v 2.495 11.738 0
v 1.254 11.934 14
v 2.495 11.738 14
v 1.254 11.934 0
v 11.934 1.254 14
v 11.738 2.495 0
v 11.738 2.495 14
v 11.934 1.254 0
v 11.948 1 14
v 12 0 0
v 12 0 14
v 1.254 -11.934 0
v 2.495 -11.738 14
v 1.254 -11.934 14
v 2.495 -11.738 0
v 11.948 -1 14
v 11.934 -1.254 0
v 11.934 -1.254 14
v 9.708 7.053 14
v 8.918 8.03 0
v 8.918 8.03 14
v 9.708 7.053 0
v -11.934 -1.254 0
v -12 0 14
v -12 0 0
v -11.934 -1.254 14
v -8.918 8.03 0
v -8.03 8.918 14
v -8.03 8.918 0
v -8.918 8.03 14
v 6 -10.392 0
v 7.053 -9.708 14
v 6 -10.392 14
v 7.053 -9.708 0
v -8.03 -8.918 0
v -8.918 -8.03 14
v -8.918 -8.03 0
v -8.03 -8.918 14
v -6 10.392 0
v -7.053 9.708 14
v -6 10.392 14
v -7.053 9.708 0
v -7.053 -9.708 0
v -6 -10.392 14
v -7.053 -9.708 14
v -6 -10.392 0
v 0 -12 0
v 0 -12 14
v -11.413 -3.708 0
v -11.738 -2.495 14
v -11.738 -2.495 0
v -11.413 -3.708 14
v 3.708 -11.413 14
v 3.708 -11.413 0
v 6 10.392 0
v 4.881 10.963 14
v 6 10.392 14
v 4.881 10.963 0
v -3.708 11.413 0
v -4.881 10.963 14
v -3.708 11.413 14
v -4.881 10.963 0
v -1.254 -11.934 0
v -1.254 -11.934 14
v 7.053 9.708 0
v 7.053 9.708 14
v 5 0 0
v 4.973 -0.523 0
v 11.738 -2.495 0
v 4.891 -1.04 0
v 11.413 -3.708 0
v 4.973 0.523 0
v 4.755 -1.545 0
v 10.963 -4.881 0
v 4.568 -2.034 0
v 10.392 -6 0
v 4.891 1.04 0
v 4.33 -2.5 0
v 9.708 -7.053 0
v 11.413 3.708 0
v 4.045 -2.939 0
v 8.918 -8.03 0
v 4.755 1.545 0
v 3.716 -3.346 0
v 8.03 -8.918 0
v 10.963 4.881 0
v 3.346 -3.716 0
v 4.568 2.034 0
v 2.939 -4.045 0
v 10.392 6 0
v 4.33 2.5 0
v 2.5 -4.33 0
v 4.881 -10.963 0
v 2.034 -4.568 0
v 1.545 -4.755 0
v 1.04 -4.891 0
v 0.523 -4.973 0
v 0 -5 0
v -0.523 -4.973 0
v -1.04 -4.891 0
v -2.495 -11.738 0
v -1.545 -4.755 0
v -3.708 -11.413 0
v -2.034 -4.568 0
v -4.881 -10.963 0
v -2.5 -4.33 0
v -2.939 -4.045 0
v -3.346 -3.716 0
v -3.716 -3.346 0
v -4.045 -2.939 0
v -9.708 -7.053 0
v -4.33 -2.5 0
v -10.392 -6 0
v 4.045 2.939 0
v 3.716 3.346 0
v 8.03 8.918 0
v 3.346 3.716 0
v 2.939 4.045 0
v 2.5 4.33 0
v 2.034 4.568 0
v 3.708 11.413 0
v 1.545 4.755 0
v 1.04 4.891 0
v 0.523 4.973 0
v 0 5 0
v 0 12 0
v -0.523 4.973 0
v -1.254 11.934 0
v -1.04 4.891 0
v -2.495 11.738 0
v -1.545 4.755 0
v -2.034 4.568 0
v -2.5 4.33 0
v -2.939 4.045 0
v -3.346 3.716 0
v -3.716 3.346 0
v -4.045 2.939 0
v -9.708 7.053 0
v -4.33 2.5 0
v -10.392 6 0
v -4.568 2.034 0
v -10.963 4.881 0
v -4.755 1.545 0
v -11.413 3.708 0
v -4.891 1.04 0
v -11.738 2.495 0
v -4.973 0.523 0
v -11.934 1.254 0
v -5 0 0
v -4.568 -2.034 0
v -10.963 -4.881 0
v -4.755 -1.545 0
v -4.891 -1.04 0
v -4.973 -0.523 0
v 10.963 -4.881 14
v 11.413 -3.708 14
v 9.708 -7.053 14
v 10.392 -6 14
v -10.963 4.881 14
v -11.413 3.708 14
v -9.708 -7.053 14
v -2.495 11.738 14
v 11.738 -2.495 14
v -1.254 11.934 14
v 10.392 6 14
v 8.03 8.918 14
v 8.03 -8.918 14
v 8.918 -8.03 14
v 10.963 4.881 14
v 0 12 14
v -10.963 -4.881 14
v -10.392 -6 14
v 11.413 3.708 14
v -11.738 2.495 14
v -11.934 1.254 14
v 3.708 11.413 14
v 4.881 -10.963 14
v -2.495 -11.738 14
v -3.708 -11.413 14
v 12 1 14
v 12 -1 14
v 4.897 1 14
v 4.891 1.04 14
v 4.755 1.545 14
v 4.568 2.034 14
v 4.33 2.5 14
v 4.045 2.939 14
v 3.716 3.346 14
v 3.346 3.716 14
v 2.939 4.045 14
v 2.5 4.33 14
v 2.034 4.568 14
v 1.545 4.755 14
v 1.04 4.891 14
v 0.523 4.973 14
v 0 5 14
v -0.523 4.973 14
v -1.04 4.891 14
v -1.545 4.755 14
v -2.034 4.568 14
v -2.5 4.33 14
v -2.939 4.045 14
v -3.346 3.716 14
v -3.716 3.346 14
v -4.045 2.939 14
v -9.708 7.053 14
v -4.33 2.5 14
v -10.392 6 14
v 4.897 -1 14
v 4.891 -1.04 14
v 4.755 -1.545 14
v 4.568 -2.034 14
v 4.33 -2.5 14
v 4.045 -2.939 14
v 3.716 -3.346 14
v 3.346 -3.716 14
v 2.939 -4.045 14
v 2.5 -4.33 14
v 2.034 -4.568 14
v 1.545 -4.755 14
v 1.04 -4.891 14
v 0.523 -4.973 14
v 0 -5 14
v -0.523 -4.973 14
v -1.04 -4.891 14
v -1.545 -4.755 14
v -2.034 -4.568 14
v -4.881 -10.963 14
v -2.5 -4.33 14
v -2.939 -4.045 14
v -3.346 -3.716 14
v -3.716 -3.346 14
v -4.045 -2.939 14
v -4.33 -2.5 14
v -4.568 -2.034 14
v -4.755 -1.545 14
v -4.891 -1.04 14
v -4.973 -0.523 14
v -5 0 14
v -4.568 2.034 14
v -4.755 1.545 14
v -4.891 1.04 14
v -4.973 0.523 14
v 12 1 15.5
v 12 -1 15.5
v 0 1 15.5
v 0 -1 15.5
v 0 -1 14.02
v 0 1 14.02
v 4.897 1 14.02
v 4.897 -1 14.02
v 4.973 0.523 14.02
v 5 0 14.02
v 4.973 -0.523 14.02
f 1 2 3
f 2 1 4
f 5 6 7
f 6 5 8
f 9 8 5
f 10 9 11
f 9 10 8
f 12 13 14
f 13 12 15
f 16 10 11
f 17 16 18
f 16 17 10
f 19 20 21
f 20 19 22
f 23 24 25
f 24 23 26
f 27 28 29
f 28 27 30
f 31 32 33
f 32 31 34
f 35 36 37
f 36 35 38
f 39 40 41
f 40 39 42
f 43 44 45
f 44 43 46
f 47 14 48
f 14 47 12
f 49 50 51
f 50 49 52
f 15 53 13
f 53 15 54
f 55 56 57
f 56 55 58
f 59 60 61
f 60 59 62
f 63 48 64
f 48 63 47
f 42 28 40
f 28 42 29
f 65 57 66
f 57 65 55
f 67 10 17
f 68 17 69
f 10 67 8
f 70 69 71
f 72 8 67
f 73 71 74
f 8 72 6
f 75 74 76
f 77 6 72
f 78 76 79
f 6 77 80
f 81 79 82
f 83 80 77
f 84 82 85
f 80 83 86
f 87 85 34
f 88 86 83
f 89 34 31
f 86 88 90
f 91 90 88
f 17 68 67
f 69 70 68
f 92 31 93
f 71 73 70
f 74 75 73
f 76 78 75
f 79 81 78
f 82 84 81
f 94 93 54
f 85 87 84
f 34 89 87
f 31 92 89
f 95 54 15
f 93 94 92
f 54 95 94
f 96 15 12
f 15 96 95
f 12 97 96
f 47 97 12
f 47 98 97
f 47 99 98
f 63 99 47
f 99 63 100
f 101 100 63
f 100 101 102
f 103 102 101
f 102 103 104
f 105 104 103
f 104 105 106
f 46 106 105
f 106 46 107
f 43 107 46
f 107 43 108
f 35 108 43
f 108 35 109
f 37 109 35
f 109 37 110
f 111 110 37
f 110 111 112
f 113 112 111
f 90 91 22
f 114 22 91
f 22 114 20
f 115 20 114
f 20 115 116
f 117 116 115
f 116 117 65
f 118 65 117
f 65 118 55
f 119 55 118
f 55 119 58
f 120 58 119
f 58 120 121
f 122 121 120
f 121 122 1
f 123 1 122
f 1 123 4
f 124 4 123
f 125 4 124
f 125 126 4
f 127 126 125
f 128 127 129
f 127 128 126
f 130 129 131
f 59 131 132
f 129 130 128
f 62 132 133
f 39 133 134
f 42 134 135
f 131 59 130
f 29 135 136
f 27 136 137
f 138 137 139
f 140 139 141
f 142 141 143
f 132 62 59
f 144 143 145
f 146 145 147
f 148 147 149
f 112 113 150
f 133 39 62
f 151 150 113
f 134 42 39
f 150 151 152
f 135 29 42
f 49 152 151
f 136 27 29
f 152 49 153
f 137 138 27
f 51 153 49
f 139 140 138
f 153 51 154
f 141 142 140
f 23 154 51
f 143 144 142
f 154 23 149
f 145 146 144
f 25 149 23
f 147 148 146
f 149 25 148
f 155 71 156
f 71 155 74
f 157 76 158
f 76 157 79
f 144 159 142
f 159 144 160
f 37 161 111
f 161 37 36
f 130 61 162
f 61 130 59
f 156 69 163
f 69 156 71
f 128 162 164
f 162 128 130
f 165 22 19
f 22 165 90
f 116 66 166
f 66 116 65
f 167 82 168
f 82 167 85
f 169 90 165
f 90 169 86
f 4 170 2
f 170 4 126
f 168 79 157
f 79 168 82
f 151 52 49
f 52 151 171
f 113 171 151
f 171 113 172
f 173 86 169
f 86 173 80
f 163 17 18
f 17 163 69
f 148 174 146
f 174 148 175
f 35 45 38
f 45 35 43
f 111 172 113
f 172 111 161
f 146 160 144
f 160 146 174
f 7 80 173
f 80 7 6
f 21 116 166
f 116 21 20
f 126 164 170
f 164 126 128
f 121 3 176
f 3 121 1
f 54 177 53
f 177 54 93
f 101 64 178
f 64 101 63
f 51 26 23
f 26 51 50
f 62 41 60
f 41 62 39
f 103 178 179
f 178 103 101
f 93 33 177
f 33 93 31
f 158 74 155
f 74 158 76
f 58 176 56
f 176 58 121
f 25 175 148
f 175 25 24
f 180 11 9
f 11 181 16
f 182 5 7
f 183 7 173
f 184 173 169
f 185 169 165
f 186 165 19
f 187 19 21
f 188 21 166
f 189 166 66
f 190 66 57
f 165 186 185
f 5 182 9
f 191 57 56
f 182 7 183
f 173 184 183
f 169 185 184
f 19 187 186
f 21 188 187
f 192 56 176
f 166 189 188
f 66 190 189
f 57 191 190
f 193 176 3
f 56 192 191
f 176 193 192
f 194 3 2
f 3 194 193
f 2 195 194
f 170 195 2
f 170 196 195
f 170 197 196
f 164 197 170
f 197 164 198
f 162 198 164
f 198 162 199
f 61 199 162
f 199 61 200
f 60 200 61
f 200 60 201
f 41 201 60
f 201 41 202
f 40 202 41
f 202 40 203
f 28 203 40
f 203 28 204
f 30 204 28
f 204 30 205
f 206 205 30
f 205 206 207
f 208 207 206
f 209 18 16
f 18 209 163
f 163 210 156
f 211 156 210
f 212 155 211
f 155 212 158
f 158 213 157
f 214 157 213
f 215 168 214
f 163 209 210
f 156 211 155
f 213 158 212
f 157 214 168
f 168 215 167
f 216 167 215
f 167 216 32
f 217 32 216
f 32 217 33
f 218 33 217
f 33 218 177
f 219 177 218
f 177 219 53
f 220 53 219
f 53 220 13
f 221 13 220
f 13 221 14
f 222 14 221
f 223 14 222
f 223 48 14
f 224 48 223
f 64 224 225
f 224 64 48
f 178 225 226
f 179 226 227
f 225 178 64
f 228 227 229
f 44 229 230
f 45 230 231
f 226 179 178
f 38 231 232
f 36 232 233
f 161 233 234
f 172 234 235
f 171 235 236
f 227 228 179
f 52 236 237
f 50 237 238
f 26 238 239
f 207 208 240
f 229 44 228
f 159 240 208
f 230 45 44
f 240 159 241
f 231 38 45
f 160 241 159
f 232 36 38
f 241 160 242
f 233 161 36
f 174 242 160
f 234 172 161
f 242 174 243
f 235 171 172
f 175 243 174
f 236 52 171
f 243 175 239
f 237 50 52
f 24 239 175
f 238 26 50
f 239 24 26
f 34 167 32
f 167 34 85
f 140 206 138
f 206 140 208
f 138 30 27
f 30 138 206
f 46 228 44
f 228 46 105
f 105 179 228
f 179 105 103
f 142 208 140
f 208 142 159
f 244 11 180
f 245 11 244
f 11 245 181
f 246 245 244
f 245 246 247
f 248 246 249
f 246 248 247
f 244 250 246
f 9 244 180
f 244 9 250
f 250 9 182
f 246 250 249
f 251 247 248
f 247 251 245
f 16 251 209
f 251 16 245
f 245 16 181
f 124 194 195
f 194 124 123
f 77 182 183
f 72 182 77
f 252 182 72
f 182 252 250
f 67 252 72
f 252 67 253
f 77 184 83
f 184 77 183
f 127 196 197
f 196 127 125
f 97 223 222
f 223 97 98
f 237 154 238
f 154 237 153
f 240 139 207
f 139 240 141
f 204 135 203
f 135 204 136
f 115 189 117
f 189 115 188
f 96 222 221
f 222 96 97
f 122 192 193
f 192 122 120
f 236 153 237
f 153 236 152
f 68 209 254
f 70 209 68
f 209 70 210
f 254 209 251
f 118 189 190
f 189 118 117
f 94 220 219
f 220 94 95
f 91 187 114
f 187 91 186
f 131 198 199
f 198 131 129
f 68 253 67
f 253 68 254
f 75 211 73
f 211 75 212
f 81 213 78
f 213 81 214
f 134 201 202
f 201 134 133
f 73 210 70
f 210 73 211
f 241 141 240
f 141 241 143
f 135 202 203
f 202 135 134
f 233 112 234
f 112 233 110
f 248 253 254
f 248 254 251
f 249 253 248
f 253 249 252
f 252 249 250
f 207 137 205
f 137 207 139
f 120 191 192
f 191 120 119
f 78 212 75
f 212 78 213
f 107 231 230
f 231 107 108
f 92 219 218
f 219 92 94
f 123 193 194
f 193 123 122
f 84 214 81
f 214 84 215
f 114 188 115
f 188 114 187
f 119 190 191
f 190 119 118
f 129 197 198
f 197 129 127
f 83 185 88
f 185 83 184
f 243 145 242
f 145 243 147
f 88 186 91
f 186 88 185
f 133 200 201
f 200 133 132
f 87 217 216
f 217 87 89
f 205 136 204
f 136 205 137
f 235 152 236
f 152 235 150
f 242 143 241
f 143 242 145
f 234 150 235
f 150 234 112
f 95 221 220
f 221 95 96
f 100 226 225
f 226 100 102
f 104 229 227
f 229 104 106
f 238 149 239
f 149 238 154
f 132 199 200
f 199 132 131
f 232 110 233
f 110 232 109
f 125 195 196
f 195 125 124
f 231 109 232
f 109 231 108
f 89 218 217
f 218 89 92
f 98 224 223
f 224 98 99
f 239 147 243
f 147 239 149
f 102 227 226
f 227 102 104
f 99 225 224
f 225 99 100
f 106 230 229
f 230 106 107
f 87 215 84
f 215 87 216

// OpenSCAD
// Pointer control knob.
$fn = 60;
eps = 0.02;
bore_d = 10;
knob_d = 24;
knob_h = 14;
difference() { union() { cylinder(d=knob_d,h=knob_h); translate([0,-1,knob_h]) cube([knob_d/2,2,1.5]); } translate([0,0,-eps]) cylinder(d=bore_d,h=knob_h+2*eps); }
